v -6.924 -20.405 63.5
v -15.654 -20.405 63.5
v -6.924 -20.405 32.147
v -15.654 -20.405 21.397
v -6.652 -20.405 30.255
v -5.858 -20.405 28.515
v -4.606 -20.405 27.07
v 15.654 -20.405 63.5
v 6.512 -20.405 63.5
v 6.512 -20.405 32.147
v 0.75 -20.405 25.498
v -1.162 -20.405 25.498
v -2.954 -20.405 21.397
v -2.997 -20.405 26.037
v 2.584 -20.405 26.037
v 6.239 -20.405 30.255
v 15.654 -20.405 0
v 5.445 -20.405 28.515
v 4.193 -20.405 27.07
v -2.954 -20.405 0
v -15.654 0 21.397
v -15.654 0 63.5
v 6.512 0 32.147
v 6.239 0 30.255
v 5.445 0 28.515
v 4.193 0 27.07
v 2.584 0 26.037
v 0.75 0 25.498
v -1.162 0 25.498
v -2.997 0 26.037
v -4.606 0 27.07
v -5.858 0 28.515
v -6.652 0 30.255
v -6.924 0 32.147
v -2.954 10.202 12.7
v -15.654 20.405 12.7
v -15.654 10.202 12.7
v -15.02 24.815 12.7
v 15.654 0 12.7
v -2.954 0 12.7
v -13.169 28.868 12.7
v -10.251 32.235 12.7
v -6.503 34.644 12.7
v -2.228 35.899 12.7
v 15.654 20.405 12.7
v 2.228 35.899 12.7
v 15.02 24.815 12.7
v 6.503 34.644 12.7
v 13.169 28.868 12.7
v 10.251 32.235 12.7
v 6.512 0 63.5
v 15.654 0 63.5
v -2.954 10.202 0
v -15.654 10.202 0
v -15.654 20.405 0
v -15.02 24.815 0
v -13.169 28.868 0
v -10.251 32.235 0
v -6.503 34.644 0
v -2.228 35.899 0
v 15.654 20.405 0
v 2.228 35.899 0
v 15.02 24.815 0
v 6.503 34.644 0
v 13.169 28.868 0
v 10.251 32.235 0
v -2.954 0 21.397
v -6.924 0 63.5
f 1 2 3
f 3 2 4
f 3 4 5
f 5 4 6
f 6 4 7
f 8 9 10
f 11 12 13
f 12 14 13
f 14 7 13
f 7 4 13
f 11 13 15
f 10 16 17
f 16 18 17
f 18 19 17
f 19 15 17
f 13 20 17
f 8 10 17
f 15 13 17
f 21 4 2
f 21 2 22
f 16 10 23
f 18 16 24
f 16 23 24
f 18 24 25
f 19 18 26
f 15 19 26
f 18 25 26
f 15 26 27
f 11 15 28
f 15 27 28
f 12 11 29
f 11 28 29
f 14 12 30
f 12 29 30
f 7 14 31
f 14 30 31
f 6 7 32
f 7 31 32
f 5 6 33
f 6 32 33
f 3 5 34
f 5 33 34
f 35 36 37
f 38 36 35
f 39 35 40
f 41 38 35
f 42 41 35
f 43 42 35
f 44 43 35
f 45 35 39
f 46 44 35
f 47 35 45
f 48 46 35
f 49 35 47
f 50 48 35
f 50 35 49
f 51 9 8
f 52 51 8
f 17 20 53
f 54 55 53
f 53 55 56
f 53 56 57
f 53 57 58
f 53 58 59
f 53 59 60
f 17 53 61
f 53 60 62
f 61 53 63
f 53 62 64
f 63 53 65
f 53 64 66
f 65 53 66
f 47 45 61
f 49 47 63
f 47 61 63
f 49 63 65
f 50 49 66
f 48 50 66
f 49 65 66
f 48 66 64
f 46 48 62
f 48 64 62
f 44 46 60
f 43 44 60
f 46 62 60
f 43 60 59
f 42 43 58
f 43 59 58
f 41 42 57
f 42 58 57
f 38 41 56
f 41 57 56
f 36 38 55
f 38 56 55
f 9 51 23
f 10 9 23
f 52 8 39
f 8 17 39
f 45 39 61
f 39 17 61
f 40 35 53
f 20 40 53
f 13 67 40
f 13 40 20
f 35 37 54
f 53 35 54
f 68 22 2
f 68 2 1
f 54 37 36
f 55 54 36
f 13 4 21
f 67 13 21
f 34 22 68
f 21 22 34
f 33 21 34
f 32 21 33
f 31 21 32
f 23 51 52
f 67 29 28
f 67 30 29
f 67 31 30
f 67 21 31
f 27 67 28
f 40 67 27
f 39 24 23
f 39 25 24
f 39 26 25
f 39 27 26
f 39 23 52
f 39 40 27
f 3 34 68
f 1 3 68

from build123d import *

# Parameters (mm, degrees)
F1_DEPTH = 12.7
F2_W     = 31.30851
F2_H     = 20.404518
F3_DEPTH = 50.8
F5_DEPTH = 25.4
F7_DEPTH = 12.7


with BuildPart() as f1:
    # F0 (on Top) → F1 (new body)
    with BuildSketch(Plane.XY):
        with BuildLine():
            Line((-15.654255, -20.404518), (15.654255, -20.404518))
            Line((15.654255, -20.404518), (15.654255, 20.404518))
            ThreePointArc((15.654255, 20.404518), (0, 36.058772), (-15.654255, 20.404518))
            Line((-15.654255, 20.404518), (-15.654255, -20.404518))
        make_face()
    extrude(amount=F1_DEPTH)

    # F2 (on face) → F3 (join)
    with BuildSketch(Plane.XY.offset(12.7)):
        with Locations((0, -10.202259)):
            Rectangle(F2_W, F2_H)
    extrude(amount=F3_DEPTH)

    # F4 (on face) → F5 (cut)
    with BuildSketch(Plane(origin=(0, 0, 0), x_dir=(-1, 0, 0), z_dir=(0, 1, 0))):
        with BuildLine():
            Line((6.924376, 63.5), (-6.511585, 63.5))
            Line((-6.511585, 63.5), (-6.511585, 32.147441))
            ThreePointArc((-6.511585, 32.147441), (0.206395, 25.42946), (6.924376, 32.147441))
            Line((6.924376, 32.147441), (6.924376, 63.5))
        make_face()
    extrude(amount=-F5_DEPTH, mode=Mode.SUBTRACT)

    # F6 (on face) → F7 (cut)
    with BuildSketch(Plane(origin=(-15.654255, 0, 0), x_dir=(0, -1, 0), z_dir=(-1, 0, 0))):
        Polygon((0, 12.7), (-10.202259, 12.7), (-10.202259, 0), (20.404518, 0), (20.404518, 12.7), (20.404518, 21.397056), (0, 21.397056), align=None)
    extrude(amount=-F7_DEPTH, mode=Mode.SUBTRACT)


solid = f1.part
